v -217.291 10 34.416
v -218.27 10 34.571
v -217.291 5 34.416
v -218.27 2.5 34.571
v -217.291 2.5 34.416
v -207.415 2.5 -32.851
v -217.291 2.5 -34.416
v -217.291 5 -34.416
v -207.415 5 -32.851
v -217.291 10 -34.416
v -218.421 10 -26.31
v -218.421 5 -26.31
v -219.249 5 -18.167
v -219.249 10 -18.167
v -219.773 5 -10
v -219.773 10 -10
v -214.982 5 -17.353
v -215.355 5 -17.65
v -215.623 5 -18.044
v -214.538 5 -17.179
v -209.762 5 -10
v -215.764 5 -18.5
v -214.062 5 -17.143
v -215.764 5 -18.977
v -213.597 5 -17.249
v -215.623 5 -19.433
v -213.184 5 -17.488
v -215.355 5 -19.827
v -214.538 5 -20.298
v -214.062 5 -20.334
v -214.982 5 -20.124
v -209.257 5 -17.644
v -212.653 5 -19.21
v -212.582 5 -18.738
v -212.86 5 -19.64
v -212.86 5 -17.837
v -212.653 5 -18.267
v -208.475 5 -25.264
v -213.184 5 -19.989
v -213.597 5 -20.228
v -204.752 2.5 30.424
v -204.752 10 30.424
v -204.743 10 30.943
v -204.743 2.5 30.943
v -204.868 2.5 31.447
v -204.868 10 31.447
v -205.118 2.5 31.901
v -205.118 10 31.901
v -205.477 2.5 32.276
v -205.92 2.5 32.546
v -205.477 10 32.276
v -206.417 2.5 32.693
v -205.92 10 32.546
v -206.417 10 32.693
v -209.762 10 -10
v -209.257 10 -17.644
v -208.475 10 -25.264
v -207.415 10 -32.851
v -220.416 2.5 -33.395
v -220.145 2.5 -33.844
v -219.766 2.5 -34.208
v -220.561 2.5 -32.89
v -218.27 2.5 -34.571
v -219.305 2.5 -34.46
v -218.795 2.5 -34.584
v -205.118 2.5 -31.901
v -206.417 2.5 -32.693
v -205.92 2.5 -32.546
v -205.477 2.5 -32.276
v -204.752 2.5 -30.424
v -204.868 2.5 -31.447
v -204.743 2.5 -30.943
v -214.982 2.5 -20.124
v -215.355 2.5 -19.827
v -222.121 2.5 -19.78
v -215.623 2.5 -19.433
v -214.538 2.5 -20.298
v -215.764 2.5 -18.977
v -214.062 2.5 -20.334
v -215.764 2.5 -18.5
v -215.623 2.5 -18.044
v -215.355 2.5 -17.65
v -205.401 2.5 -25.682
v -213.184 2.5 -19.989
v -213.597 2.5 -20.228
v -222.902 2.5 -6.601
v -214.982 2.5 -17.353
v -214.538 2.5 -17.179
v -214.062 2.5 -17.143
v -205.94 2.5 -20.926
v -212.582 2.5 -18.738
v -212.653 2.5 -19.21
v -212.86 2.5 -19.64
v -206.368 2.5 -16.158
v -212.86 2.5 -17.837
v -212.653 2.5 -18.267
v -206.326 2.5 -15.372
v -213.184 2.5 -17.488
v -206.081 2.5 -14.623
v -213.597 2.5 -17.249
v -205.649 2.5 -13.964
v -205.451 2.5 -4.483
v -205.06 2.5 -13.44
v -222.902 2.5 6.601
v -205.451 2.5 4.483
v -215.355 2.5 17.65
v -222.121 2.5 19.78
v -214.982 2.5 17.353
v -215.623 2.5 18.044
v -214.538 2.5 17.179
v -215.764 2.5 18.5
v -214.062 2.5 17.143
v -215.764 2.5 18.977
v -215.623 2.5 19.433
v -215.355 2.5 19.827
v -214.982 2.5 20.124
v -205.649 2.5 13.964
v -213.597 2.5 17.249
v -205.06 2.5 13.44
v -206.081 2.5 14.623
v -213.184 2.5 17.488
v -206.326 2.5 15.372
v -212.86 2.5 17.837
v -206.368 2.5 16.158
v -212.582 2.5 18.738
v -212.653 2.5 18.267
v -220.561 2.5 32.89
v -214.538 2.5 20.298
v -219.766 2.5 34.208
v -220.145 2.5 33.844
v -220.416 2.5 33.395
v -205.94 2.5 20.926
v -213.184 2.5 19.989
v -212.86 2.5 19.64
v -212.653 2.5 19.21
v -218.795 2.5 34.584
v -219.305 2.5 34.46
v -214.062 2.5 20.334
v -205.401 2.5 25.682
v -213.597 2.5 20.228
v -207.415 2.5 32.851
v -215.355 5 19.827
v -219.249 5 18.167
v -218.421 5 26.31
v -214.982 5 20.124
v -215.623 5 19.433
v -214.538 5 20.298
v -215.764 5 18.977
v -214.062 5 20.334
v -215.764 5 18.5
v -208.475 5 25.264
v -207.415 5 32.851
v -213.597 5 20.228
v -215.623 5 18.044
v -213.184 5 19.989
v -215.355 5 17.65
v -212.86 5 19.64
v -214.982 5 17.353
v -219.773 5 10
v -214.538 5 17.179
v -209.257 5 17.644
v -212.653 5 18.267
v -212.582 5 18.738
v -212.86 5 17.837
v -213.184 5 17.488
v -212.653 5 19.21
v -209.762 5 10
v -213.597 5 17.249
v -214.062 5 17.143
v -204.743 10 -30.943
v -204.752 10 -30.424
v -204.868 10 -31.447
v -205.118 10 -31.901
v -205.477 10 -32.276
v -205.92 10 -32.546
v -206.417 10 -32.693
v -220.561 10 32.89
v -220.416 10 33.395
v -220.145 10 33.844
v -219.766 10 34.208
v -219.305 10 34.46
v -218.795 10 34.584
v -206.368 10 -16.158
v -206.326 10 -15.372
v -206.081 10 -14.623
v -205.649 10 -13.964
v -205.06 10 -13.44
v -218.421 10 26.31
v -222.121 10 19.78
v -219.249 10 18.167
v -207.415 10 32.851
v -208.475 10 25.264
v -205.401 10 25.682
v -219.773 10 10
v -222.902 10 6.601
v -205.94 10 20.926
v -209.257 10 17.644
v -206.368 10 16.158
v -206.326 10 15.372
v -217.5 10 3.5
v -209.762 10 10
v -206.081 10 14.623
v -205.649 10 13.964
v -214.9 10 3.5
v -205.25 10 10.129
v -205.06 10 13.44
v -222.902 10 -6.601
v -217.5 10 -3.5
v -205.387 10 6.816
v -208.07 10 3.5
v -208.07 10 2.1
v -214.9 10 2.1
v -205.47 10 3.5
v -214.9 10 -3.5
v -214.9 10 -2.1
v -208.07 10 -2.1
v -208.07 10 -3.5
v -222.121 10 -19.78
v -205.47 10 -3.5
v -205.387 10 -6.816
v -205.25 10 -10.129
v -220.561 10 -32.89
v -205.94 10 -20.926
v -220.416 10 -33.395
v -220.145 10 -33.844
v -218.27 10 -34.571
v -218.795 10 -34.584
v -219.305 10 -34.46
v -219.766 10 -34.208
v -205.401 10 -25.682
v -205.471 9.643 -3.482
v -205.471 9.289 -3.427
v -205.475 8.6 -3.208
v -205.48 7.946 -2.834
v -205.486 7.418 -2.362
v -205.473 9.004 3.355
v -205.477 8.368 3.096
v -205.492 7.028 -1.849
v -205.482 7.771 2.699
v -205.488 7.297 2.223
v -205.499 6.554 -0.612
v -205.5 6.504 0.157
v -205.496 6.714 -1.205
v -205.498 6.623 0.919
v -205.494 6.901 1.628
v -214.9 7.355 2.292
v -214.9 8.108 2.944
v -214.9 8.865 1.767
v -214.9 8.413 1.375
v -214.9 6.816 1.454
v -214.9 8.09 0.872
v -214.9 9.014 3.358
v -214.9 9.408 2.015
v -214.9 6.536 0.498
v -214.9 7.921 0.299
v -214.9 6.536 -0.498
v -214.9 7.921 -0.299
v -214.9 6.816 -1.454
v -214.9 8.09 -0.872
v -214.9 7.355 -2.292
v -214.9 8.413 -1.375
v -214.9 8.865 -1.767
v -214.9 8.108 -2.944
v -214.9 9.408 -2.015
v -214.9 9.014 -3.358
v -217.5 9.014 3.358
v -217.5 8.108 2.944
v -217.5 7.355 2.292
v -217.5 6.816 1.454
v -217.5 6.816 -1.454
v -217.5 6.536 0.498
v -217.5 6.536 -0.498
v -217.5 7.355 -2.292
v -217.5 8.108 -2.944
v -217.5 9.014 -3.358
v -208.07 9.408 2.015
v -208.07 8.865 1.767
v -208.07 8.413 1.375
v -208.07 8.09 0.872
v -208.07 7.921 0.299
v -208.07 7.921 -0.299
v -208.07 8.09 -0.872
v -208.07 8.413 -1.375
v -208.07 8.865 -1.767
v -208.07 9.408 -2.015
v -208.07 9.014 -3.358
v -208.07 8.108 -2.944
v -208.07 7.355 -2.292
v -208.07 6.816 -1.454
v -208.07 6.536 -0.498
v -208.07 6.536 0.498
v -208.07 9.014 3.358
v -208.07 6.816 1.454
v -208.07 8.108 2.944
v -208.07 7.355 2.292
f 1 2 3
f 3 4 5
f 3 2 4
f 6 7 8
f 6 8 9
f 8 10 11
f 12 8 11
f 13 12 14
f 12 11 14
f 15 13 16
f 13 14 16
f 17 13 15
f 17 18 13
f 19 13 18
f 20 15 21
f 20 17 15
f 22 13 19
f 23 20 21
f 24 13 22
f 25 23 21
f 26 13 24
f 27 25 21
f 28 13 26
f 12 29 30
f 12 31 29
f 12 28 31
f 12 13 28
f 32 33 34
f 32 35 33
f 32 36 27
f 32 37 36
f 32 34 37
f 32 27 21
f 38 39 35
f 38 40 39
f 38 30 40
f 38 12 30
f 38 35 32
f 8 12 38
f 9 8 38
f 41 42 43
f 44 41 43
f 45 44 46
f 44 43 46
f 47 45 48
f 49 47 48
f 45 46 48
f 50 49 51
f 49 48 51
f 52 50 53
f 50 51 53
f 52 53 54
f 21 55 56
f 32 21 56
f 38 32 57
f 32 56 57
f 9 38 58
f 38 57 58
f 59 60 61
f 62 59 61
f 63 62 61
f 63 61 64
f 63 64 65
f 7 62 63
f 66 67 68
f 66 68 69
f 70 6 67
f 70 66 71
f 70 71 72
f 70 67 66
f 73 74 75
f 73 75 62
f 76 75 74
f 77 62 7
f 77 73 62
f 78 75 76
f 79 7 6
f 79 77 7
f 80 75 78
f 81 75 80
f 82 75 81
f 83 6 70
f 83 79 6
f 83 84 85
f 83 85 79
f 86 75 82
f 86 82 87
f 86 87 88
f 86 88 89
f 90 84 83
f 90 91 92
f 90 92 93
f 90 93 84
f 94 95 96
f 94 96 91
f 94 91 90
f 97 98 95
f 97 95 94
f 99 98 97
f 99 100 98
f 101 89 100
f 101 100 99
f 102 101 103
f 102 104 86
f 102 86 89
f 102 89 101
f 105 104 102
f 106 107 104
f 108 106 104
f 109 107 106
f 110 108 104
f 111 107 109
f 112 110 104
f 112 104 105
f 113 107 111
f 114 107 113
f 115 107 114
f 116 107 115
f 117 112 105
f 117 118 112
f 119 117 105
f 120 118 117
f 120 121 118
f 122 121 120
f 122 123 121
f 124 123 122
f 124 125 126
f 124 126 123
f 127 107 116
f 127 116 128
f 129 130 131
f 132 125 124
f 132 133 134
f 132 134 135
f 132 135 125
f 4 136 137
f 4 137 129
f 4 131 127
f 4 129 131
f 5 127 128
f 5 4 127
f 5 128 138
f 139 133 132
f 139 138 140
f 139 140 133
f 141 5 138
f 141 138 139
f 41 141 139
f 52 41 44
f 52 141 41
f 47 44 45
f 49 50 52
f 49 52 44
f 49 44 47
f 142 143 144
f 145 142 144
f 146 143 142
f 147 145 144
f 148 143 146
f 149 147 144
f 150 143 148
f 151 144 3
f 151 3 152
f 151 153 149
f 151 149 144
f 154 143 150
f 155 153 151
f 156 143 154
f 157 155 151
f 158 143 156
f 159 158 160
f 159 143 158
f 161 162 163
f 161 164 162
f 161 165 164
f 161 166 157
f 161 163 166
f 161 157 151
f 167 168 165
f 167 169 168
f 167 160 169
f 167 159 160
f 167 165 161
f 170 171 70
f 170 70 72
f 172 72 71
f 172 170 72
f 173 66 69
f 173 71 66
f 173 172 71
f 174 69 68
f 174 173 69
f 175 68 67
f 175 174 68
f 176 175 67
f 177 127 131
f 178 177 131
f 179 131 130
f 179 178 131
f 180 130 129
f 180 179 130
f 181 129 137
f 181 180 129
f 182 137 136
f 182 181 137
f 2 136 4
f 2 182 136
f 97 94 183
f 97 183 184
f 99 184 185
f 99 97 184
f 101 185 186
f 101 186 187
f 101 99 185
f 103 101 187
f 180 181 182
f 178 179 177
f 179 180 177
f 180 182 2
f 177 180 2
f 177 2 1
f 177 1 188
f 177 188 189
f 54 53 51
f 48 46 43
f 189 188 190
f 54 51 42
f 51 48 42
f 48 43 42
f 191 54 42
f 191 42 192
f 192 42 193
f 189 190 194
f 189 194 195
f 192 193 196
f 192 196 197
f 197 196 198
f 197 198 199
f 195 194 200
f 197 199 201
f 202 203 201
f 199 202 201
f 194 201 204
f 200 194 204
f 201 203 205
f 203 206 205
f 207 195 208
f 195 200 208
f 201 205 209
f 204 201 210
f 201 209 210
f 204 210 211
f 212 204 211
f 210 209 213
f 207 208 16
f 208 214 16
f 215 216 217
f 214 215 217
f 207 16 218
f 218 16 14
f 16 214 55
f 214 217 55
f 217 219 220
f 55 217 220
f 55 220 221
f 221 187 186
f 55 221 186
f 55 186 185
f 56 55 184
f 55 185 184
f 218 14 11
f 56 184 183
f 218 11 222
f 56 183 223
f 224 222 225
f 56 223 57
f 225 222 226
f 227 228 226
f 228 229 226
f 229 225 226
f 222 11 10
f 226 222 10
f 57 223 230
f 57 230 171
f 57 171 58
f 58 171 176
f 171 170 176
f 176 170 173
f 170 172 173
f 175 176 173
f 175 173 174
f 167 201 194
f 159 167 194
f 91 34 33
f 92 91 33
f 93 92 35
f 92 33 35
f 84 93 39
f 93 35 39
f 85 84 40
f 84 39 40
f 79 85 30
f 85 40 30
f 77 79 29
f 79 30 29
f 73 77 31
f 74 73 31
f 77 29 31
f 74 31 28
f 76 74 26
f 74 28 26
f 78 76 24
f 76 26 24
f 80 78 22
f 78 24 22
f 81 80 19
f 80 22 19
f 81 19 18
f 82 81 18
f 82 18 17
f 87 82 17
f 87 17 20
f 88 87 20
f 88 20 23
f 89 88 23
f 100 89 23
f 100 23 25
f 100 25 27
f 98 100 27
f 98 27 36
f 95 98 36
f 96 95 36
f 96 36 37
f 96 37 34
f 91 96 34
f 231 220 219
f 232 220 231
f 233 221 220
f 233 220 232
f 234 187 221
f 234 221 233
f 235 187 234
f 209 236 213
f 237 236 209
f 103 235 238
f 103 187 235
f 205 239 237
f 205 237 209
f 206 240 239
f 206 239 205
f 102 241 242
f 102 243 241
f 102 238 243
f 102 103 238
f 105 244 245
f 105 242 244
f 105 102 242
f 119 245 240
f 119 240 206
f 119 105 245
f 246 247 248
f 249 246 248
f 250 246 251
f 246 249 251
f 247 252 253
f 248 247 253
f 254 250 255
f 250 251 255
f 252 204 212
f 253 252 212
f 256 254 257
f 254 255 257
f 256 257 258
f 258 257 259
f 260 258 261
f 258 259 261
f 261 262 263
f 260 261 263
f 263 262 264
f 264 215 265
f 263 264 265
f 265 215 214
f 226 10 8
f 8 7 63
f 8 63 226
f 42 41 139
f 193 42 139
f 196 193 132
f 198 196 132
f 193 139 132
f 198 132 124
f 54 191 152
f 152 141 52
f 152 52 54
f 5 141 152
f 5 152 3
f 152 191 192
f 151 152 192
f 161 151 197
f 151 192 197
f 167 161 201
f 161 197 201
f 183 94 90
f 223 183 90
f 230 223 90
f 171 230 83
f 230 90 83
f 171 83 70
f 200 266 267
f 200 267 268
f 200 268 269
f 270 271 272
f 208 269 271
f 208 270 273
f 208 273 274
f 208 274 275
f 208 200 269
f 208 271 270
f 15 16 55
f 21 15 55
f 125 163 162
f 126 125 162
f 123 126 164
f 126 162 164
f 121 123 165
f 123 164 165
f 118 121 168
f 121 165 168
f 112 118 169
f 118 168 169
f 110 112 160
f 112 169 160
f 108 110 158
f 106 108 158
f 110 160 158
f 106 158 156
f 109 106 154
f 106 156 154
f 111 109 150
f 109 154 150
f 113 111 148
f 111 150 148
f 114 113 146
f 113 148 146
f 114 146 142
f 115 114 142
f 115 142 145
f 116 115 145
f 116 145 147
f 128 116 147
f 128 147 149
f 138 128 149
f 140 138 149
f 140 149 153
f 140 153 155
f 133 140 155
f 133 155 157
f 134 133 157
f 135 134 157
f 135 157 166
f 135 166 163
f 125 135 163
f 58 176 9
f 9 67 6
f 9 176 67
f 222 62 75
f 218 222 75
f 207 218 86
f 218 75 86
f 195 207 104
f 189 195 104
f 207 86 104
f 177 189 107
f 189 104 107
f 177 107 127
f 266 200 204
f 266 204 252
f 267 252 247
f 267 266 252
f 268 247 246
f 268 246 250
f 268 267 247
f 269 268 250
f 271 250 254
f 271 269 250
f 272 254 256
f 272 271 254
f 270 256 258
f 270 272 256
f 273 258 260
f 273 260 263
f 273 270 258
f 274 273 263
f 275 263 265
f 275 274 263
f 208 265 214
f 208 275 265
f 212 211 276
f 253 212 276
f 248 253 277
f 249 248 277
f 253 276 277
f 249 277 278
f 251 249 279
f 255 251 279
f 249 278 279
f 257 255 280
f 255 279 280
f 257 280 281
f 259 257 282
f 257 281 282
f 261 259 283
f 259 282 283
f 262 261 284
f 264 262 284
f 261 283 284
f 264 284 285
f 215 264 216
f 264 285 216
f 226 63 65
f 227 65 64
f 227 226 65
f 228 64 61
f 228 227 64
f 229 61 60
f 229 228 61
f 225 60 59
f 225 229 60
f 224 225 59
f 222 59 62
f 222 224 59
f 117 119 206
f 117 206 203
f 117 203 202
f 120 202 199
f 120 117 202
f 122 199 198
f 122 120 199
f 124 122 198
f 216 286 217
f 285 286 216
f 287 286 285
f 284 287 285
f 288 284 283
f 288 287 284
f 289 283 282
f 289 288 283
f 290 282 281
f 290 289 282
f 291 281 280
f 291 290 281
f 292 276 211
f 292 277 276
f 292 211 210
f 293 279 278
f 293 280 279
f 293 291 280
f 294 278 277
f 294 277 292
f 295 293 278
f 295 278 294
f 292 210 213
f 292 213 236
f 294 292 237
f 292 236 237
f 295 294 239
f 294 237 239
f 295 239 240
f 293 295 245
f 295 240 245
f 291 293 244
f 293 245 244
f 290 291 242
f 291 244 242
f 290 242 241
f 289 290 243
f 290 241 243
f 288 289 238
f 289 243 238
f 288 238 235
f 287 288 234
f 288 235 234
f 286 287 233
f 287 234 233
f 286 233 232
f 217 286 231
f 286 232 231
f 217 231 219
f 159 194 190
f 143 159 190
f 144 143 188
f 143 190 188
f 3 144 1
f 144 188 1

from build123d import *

# Parameters (mm, degrees)
BOSS_EXTRUDE1_DEPTH        = 10
CUT_EXTRUDE1_DEPTH         = 5
F_3_2_3_2_DIAMETER_HOLE1_D = 3.2
BOSS_EXTRUDE2_DEPTH        = 10
FILLET1_R                  = 3
FILLET2_R                  = 2
CUT_EXTRUDE6_DEPTH         = 2.5
SKETCH28_R                 = 3.5
CUT_EXTRUDE7_DEPTH         = 2.6
SKETCH29_W                 = 2.6
SKETCH29_H                 = 3.5
SKETCH30_R                 = 2.1
CUT_EXTRUDE8_DEPTH         = 6.829807515


with BuildPart() as part:
    # Sketch1 → Boss-Extrude1 (new body)
    with BuildSketch(Plane(origin=(0, 0, 0), x_dir=(1, 0, 0), z_dir=(0, 1, 0))):
        with BuildLine():
            ThreePointArc((-207.414551525, 32.851237658), (-210, 0), (-207.414551525, -32.851237658))
            Line((-207.414551525, -32.851237658), (-217.291434931, -34.415582309))
            ThreePointArc((-217.291434931, -34.415582309), (-220, 0), (-217.291434931, 34.415582309))
            Line((-217.291434931, 34.415582309), (-207.414551525, 32.851237658))
        make_face()
        with BuildLine():
            ThreePointArc((-217.291434931, -34.415582309), (-220, 0), (-217.291434931, 34.415582309))
            Line((-217.291434931, 34.415582309), (-220.254499953, 34.884885704))
            ThreePointArc((-220.254499953, 34.884885704), (-223, 0), (-220.254499953, -34.884885704))
            Line((-220.254499953, -34.884885704), (-217.291434931, -34.415582309))
        make_face()
        with BuildLine():
            Line((-204.451486503, 32.381934263), (-207.414551525, 32.851237658))
            ThreePointArc((-207.414551525, 32.851237658), (-210, 0), (-207.414551525, -32.851237658))
            Line((-207.414551525, -32.851237658), (-204.451486503, -32.381934263))
            ThreePointArc((-204.451486503, -32.381934263), (-207, 0), (-204.451486503, 32.381934263))
        make_face()
    extrude(amount=BOSS_EXTRUDE1_DEPTH)

    # Sketch15 → Cut-Extrude1 (cut)
    with BuildSketch(Plane(origin=(0, 10, 0), x_dir=(1, 0, 0), z_dir=(0, 1, 0))):
        with BuildLine():
            Line((-219.772609758, 10), (-209.761769634, 10))
            ThreePointArc((-209.761769634, 10), (-208.900850883, 21.457737542), (-207.414551525, 32.851237658))
            Line((-207.414551525, 32.851237658), (-217.291434931, 34.415582309))
            ThreePointArc((-217.291434931, 34.415582309), (-218.872736893, 22.242415451), (-219.772609758, 10))
        make_face()
        with BuildLine():
            ThreePointArc((-207.414551525, -32.851237658), (-208.900850883, -21.457737542), (-209.761769634, -10))
            Line((-209.761769634, -10), (-219.772609758, -10))
            ThreePointArc((-219.772609758, -10), (-218.872736893, -22.242415451), (-217.291434931, -34.415582309))
            Line((-217.291434931, -34.415582309), (-207.414551525, -32.851237658))
        make_face()
    extrude(amount=-CUT_EXTRUDE1_DEPTH, mode=Mode.SUBTRACT)

    # Ø3.2 (3.2) Diameter Hole1 (through all)
    with Locations(Plane(origin=(0, 0, 0), x_dir=(-1, 0, 0), z_dir=(0, -1, 0))):
        with Locations((214.18186009, -18.738484691), (214.18186009, 18.738484691)):
            Hole(F_3_2_3_2_DIAMETER_HOLE1_D / 2)

    # Sketch19 → Boss-Extrude2 (add)
    with BuildSketch(Plane(origin=(0, 0, 0), x_dir=(1, 0, 0), z_dir=(0, 1, 0))):
        with BuildLine():
            Line((-205.060008726, -13.440343057), (-206.55679711, -13.538447751))
            ThreePointArc((-206.55679711, -13.538447751), (-207, 0), (-206.55679711, 13.538447751))
            Line((-206.55679711, 13.538447751), (-205.060008726, 13.440343057))
            ThreePointArc((-205.060008726, 13.440343057), (-205.5, 0), (-205.060008726, -13.440343057))
        make_face()
    extrude(amount=BOSS_EXTRUDE2_DEPTH)

    # Fillet1
    # the kernel refuses this fillet: 3 mm, written as the material it adds along each edge
    with BuildSketch(Plane(origin=(-206.55679711, 0, -13.538447751), x_dir=(0.071732779716433, 0, -0.9974238859753429), z_dir=(0, 1, 0))) as fillet1_piece_1:
        with BuildLine():
            CenterArc((2.607610468, -2.999939619), FILLET1_R, 89.636481565, 60.364184224)
            Line((0.009516827, -1.49996981), (-0.042445046, -1.469970414))
            ThreePointArc((-0.042445046, -1.469970414), (-0.055240379, -0.750365578), (-0.059998792, -0.000380673))
            Line((-0.059998792, -0.000380673), (-0.000380673, 0.059998792))
            ThreePointArc((-0.000380673, 0.059998792), (1.313322061, 0.064166261), (2.627024794, 0.059998792))
            Line((2.627024794, 0.059998792), (2.626644121, 0))
        make_face()
    extrude(amount=10)
    with BuildSketch(Plane(origin=(-206.55679711, 0, 13.538447751), x_dir=(0.07173277971643319, 0, 0.9974238859753429), z_dir=(0, 1, 0))) as fillet1_piece_2:
        with BuildLine():
            CenterArc((2.607610468, 2.999939619), FILLET1_R, 209.999334211, 60.364184224)
            Line((0.009516827, 1.49996981), (-0.042445046, 1.469970414))
            ThreePointArc((-0.042445046, 1.469970414), (-0.055240379, 0.750365578), (-0.059998792, 0.000380673))
            Line((-0.059998792, 0.000380673), (-0.000380673, -0.059998792))
            ThreePointArc((-0.000380673, -0.059998792), (1.313322061, -0.064166261), (2.627024794, -0.059998792))
            Line((2.627024794, -0.059998792), (2.626644121, 0))
        make_face()
    extrude(amount=10)

    # Fillet2
    fillet2_edges = [part.edges().sort_by_distance(p)[0] for p in [
        (-220.254499953, 5, 34.884885704),
        (-220.254499953, 5, -34.884885704),
        (-204.451486503, 5, -32.381934263),
        (-204.451486503, 5, 32.381934263),
    ]]
    fillet(fillet2_edges, radius=FILLET2_R)

    # Sketch26 → Cut-Extrude6 (cut)
    with BuildSketch(Plane.XZ):
        with BuildLine():
            Line((-218.270184732, -34.570601048), (-206.417411405, -32.693306179))
            ThreePointArc((-206.417411405, -32.693306179), (-205.117889671, -31.901228423), (-204.75200014, -30.423978019))
            ThreePointArc((-204.75200014, -30.423978019), (-205.683905744, -23.30516934), (-206.368380626, -16.158325337))
            ThreePointArc((-206.368380626, -16.158325337), (-206.080650798, -14.622930952), (-205.060008726, -13.440343057))
            ThreePointArc((-205.060008726, -13.440343057), (-205.5, 0), (-205.060008726, 13.440343057))
            ThreePointArc((-205.060008726, 13.440343057), (-206.080650798, 14.622930952), (-206.368380626, 16.158325337))
            ThreePointArc((-206.368380626, 16.158325337), (-205.683905744, 23.30516934), (-204.75200014, 30.423978019))
            ThreePointArc((-204.75200014, 30.423978019), (-205.117889671, 31.901228423), (-206.417411405, 32.693306179))
            Line((-206.417411405, 32.693306179), (-218.270184732, 34.570601048))
            ThreePointArc((-218.270184732, 34.570601048), (-219.765933628, 34.207922413), (-220.561180845, 32.890203773))
            ThreePointArc((-220.561180845, 32.890203773), (-223, 0), (-220.561180845, -32.890203773))
            ThreePointArc((-220.561180845, -32.890203773), (-219.765933628, -34.207922413), (-218.270184732, -34.570601048))
        make_face()
    extrude(amount=-CUT_EXTRUDE6_DEPTH, mode=Mode.SUBTRACT)

    # Sketch28 → Cut-Extrude7 (cut)
    with BuildSketch(Plane(origin=(-217.5, 0, 0), x_dir=(0, 0, -1), z_dir=(1, 0, 0))):
        with Locations((0, 10)):
            Circle(SKETCH28_R)
    extrude(amount=CUT_EXTRUDE7_DEPTH, mode=Mode.SUBTRACT)

    # Sketch29 → Cut-Revolve1 (revolve, cut)
    with BuildSketch(Plane(origin=(0, 10, 0), x_dir=(1, 0, 0), z_dir=(0, 1, 0))):
        with Locations((-206.770192485, -1.75)):
            Rectangle(SKETCH29_W, SKETCH29_H)
    revolve(axis=Axis((-217.5, 10, 0), (1, 0, 0)), mode=Mode.SUBTRACT)

    # Sketch30 → Cut-Extrude8 (cut)
    with BuildSketch(Plane(origin=(-208.070192485, 0, 0), x_dir=(0, 0, -1), z_dir=(1, 0, 0))):
        with Locations((0, 10)):
            Circle(SKETCH30_R)
    extrude(amount=-CUT_EXTRUDE8_DEPTH, mode=Mode.SUBTRACT)


solid = part.part
